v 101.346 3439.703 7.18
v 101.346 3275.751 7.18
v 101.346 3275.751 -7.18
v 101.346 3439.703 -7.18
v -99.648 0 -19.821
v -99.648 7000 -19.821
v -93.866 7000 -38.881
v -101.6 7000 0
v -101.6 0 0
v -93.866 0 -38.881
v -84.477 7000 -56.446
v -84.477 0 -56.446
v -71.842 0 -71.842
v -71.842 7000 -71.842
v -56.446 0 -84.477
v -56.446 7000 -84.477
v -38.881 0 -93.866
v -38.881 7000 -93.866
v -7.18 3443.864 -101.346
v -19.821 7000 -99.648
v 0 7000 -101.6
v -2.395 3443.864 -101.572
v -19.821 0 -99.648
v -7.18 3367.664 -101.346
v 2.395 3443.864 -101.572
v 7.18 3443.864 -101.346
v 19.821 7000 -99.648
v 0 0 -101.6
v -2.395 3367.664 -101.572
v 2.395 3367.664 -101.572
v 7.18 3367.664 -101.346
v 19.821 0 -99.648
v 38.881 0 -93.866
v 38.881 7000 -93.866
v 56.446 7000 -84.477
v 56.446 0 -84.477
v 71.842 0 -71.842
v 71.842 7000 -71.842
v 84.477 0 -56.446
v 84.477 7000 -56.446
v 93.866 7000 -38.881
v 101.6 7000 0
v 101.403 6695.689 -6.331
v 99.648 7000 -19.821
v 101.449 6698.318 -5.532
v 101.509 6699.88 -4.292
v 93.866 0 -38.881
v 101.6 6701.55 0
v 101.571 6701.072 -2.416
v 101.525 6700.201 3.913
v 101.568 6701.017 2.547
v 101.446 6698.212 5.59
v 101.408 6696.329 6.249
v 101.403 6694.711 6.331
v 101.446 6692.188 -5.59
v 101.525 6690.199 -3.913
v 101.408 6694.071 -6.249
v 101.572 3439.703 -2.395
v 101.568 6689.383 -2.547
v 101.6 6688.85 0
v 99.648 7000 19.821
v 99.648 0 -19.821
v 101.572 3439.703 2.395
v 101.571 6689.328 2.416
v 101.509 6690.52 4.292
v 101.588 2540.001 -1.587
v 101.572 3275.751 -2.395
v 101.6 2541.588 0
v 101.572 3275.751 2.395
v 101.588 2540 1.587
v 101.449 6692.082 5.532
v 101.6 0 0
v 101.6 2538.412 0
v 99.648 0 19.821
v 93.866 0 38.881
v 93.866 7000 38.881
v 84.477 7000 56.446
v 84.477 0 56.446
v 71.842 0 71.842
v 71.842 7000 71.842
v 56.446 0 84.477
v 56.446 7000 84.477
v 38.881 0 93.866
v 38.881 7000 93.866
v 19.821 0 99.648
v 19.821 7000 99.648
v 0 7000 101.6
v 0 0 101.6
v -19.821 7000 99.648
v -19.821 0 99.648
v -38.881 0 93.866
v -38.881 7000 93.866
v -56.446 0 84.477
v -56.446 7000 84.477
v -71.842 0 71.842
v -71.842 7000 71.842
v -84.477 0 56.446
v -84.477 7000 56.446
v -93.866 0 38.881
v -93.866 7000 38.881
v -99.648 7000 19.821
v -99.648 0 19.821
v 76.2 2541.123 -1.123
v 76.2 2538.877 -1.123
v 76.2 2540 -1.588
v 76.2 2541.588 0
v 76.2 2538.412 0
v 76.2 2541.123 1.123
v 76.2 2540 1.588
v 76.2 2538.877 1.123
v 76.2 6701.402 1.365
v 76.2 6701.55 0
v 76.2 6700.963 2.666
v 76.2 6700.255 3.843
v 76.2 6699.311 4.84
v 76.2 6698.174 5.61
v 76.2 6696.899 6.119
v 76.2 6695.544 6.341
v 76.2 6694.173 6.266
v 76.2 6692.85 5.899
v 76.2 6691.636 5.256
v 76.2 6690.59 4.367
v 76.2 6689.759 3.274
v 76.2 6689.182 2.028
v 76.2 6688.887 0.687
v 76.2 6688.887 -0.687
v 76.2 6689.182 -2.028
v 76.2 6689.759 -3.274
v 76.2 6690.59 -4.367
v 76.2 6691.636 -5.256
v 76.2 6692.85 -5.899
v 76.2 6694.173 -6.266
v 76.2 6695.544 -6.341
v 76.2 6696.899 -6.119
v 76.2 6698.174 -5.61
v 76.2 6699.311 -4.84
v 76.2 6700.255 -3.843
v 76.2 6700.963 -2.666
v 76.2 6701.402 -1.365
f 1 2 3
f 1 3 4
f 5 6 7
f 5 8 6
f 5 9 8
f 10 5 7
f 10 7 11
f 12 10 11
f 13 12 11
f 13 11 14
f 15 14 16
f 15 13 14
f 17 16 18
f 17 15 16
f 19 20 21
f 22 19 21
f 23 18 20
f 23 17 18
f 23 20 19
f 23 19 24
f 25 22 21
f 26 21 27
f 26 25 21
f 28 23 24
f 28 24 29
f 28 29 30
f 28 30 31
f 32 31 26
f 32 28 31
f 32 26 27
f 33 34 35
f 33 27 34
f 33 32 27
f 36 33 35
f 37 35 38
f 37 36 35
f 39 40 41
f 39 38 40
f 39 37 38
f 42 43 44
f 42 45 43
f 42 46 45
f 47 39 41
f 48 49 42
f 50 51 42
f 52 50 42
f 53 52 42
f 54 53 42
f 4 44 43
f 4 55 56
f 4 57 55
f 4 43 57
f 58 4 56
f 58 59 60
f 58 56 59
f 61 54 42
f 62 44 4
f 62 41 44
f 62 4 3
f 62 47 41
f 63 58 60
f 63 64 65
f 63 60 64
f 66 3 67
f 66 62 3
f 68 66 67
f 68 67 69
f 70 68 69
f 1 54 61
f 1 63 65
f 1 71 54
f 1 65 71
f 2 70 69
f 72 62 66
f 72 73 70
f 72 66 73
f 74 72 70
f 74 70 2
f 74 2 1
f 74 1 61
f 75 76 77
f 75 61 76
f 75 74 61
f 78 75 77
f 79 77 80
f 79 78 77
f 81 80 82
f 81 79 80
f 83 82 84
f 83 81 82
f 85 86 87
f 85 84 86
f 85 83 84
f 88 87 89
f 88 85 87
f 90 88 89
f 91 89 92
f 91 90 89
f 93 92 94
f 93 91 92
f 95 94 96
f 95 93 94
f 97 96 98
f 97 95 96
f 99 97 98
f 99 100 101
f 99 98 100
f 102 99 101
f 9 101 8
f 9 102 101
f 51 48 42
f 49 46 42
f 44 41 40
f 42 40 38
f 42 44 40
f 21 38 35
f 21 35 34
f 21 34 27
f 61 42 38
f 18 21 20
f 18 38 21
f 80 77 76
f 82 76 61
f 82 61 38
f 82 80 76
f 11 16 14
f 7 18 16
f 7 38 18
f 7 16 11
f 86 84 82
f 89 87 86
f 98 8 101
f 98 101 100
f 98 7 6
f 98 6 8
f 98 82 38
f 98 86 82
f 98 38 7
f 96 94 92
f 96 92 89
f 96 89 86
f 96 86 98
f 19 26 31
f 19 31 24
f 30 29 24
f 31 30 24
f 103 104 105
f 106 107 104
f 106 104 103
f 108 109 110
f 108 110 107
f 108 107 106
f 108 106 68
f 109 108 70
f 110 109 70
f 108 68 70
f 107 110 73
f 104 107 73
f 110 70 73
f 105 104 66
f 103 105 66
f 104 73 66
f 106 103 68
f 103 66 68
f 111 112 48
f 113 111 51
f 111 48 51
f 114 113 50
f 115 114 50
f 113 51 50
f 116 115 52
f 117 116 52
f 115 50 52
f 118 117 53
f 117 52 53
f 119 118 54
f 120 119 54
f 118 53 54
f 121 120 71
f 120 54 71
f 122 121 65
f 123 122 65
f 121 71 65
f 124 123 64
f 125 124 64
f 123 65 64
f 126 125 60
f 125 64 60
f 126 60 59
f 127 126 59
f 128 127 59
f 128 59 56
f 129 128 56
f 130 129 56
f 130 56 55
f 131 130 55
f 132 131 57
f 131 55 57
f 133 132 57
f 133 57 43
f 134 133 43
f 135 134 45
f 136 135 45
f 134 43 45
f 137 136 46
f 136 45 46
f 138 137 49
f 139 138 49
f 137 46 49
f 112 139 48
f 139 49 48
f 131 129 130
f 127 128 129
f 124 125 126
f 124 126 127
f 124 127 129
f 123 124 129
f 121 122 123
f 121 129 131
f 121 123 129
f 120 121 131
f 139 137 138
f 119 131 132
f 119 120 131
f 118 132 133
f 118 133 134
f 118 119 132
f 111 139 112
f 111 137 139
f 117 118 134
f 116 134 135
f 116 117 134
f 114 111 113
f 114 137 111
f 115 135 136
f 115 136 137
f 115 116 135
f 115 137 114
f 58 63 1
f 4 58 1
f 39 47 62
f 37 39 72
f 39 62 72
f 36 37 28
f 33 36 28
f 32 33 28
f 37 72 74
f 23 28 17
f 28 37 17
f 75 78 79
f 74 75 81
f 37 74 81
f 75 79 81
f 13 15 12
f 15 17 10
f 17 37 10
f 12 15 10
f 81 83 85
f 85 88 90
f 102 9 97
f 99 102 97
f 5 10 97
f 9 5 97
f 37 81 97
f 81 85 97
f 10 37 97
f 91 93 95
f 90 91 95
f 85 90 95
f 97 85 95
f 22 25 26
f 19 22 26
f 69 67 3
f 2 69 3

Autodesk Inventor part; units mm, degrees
ref_plane "YZ Plane" through (0, 0, 0) normal (1, 0, 0) x (0, 1, 0)
sketch "Sketch1" plane through (0, 0, 0) normal (0, 1, 0) x (-1, 0, 0)
  circle A0 centre (0, 0) radius 101.6
  dimension "d0" = 203.2
extrude "Extrusion1" add sketch "Sketch1" along normal blind 7000
sketch "Sketch2" plane through (0, 0, 0) normal (0, -1, 0) x (1, 0, 0)
  circle A0 centre (0, 0) radius 101.6 projected
extrude "Extrusion2" [suppressed]
sketch "Sketch3" plane through (0, 7000, 0) normal (0, 1, 0) x (1, 0, 0)
  circle A0 centre (0, 0) radius 101.6 projected
  point P0 (101.6, 0)
ref_plane "Work Plane1" through (101.6, 7000, 0) normal (1, 0, 0) x (0, 1, 0)
sketch "Sketch4" plane through (101.6, 7000, 0) normal (1, 0, 0) x (0, 1, 0)
  line L0 (-3724.2493, -34.0955) -> (-3560.2966, -34.0955)
  line L1 (-3560.2966, -34.0955) -> (-3560.2966, 34.0407)
  line L2 (-3560.2966, 34.0407) -> (-3724.2493, 34.0407)
  line L3 (-3724.2493, 34.0407) -> (-3724.2493, -34.0955)
  line L4 (-3724.2493, -0.0274) -> (-3560.2966, -0.0274) construction
  point P0 (-7000, 0)
extrude "poleStandRadialRef" cut sketch "Sketch4" against normal blind 0.254
sketch "Sketch5" plane through (0, 7000, 0) normal (0, 1, 0) x (1, 0, 0)
  circle A0 centre (0, 0) radius 101.6 projected
  point P0 (0, 101.6)
ref_plane "Work Plane2" through (0, 7000, -101.6) normal (0, 0, -1) x (-1, 0, 0)
sketch "Sketch6" plane through (0, 7000, -101.6) normal (0, 0, -1) x (-1, 0, 0)
  line L0 (-25.3983, -3556.136) -> (25.4017, -3556.136)
  line L1 (25.4017, -3556.136) -> (25.4017, -3632.336)
  line L2 (25.4017, -3632.336) -> (-25.3983, -3632.336)
  line L3 (-25.3983, -3632.336) -> (-25.3983, -3556.136)
  line L4 (0.0017, -3556.136) -> (0.0017, -3632.336) construction
  point P0 (0, -7000)
  dimension "d7" = 50.8
  dimension "d8" = 76.2
extrude "poleStandOffsetRef" cut sketch "Sketch6" against normal blind 0.254
sketch "Sketch7" plane through (101.6, 7000, 0) normal (1, 0, 0) x (0, 1, 0)
  circle A0 centre (-304.8, 0) radius 6.35
  line L0 (0, -101.6) -> (0, 101.6) projected
  point P0 (-7000, 0)
  dimension "d11" = 12.7
  dimension "d12" = 304.8
extrude "eyeBoltHole" cut sketch "Sketch7" against normal blind 25.4
sketch "Sketch8" plane through (101.6, 7000, 0) normal (1, 0, 0) x (0, 1, 0)
  circle A0 centre (-4460, 0) radius 1.5875
  point P0 (-7000, 0)
  dimension "d15" = 3.175
  dimension "d16" = 2540
extrude "smallEyeBolt" cut sketch "Sketch8" against normal blind 25.4
properties part number "2p2pol" material "Wood (Maple)"
